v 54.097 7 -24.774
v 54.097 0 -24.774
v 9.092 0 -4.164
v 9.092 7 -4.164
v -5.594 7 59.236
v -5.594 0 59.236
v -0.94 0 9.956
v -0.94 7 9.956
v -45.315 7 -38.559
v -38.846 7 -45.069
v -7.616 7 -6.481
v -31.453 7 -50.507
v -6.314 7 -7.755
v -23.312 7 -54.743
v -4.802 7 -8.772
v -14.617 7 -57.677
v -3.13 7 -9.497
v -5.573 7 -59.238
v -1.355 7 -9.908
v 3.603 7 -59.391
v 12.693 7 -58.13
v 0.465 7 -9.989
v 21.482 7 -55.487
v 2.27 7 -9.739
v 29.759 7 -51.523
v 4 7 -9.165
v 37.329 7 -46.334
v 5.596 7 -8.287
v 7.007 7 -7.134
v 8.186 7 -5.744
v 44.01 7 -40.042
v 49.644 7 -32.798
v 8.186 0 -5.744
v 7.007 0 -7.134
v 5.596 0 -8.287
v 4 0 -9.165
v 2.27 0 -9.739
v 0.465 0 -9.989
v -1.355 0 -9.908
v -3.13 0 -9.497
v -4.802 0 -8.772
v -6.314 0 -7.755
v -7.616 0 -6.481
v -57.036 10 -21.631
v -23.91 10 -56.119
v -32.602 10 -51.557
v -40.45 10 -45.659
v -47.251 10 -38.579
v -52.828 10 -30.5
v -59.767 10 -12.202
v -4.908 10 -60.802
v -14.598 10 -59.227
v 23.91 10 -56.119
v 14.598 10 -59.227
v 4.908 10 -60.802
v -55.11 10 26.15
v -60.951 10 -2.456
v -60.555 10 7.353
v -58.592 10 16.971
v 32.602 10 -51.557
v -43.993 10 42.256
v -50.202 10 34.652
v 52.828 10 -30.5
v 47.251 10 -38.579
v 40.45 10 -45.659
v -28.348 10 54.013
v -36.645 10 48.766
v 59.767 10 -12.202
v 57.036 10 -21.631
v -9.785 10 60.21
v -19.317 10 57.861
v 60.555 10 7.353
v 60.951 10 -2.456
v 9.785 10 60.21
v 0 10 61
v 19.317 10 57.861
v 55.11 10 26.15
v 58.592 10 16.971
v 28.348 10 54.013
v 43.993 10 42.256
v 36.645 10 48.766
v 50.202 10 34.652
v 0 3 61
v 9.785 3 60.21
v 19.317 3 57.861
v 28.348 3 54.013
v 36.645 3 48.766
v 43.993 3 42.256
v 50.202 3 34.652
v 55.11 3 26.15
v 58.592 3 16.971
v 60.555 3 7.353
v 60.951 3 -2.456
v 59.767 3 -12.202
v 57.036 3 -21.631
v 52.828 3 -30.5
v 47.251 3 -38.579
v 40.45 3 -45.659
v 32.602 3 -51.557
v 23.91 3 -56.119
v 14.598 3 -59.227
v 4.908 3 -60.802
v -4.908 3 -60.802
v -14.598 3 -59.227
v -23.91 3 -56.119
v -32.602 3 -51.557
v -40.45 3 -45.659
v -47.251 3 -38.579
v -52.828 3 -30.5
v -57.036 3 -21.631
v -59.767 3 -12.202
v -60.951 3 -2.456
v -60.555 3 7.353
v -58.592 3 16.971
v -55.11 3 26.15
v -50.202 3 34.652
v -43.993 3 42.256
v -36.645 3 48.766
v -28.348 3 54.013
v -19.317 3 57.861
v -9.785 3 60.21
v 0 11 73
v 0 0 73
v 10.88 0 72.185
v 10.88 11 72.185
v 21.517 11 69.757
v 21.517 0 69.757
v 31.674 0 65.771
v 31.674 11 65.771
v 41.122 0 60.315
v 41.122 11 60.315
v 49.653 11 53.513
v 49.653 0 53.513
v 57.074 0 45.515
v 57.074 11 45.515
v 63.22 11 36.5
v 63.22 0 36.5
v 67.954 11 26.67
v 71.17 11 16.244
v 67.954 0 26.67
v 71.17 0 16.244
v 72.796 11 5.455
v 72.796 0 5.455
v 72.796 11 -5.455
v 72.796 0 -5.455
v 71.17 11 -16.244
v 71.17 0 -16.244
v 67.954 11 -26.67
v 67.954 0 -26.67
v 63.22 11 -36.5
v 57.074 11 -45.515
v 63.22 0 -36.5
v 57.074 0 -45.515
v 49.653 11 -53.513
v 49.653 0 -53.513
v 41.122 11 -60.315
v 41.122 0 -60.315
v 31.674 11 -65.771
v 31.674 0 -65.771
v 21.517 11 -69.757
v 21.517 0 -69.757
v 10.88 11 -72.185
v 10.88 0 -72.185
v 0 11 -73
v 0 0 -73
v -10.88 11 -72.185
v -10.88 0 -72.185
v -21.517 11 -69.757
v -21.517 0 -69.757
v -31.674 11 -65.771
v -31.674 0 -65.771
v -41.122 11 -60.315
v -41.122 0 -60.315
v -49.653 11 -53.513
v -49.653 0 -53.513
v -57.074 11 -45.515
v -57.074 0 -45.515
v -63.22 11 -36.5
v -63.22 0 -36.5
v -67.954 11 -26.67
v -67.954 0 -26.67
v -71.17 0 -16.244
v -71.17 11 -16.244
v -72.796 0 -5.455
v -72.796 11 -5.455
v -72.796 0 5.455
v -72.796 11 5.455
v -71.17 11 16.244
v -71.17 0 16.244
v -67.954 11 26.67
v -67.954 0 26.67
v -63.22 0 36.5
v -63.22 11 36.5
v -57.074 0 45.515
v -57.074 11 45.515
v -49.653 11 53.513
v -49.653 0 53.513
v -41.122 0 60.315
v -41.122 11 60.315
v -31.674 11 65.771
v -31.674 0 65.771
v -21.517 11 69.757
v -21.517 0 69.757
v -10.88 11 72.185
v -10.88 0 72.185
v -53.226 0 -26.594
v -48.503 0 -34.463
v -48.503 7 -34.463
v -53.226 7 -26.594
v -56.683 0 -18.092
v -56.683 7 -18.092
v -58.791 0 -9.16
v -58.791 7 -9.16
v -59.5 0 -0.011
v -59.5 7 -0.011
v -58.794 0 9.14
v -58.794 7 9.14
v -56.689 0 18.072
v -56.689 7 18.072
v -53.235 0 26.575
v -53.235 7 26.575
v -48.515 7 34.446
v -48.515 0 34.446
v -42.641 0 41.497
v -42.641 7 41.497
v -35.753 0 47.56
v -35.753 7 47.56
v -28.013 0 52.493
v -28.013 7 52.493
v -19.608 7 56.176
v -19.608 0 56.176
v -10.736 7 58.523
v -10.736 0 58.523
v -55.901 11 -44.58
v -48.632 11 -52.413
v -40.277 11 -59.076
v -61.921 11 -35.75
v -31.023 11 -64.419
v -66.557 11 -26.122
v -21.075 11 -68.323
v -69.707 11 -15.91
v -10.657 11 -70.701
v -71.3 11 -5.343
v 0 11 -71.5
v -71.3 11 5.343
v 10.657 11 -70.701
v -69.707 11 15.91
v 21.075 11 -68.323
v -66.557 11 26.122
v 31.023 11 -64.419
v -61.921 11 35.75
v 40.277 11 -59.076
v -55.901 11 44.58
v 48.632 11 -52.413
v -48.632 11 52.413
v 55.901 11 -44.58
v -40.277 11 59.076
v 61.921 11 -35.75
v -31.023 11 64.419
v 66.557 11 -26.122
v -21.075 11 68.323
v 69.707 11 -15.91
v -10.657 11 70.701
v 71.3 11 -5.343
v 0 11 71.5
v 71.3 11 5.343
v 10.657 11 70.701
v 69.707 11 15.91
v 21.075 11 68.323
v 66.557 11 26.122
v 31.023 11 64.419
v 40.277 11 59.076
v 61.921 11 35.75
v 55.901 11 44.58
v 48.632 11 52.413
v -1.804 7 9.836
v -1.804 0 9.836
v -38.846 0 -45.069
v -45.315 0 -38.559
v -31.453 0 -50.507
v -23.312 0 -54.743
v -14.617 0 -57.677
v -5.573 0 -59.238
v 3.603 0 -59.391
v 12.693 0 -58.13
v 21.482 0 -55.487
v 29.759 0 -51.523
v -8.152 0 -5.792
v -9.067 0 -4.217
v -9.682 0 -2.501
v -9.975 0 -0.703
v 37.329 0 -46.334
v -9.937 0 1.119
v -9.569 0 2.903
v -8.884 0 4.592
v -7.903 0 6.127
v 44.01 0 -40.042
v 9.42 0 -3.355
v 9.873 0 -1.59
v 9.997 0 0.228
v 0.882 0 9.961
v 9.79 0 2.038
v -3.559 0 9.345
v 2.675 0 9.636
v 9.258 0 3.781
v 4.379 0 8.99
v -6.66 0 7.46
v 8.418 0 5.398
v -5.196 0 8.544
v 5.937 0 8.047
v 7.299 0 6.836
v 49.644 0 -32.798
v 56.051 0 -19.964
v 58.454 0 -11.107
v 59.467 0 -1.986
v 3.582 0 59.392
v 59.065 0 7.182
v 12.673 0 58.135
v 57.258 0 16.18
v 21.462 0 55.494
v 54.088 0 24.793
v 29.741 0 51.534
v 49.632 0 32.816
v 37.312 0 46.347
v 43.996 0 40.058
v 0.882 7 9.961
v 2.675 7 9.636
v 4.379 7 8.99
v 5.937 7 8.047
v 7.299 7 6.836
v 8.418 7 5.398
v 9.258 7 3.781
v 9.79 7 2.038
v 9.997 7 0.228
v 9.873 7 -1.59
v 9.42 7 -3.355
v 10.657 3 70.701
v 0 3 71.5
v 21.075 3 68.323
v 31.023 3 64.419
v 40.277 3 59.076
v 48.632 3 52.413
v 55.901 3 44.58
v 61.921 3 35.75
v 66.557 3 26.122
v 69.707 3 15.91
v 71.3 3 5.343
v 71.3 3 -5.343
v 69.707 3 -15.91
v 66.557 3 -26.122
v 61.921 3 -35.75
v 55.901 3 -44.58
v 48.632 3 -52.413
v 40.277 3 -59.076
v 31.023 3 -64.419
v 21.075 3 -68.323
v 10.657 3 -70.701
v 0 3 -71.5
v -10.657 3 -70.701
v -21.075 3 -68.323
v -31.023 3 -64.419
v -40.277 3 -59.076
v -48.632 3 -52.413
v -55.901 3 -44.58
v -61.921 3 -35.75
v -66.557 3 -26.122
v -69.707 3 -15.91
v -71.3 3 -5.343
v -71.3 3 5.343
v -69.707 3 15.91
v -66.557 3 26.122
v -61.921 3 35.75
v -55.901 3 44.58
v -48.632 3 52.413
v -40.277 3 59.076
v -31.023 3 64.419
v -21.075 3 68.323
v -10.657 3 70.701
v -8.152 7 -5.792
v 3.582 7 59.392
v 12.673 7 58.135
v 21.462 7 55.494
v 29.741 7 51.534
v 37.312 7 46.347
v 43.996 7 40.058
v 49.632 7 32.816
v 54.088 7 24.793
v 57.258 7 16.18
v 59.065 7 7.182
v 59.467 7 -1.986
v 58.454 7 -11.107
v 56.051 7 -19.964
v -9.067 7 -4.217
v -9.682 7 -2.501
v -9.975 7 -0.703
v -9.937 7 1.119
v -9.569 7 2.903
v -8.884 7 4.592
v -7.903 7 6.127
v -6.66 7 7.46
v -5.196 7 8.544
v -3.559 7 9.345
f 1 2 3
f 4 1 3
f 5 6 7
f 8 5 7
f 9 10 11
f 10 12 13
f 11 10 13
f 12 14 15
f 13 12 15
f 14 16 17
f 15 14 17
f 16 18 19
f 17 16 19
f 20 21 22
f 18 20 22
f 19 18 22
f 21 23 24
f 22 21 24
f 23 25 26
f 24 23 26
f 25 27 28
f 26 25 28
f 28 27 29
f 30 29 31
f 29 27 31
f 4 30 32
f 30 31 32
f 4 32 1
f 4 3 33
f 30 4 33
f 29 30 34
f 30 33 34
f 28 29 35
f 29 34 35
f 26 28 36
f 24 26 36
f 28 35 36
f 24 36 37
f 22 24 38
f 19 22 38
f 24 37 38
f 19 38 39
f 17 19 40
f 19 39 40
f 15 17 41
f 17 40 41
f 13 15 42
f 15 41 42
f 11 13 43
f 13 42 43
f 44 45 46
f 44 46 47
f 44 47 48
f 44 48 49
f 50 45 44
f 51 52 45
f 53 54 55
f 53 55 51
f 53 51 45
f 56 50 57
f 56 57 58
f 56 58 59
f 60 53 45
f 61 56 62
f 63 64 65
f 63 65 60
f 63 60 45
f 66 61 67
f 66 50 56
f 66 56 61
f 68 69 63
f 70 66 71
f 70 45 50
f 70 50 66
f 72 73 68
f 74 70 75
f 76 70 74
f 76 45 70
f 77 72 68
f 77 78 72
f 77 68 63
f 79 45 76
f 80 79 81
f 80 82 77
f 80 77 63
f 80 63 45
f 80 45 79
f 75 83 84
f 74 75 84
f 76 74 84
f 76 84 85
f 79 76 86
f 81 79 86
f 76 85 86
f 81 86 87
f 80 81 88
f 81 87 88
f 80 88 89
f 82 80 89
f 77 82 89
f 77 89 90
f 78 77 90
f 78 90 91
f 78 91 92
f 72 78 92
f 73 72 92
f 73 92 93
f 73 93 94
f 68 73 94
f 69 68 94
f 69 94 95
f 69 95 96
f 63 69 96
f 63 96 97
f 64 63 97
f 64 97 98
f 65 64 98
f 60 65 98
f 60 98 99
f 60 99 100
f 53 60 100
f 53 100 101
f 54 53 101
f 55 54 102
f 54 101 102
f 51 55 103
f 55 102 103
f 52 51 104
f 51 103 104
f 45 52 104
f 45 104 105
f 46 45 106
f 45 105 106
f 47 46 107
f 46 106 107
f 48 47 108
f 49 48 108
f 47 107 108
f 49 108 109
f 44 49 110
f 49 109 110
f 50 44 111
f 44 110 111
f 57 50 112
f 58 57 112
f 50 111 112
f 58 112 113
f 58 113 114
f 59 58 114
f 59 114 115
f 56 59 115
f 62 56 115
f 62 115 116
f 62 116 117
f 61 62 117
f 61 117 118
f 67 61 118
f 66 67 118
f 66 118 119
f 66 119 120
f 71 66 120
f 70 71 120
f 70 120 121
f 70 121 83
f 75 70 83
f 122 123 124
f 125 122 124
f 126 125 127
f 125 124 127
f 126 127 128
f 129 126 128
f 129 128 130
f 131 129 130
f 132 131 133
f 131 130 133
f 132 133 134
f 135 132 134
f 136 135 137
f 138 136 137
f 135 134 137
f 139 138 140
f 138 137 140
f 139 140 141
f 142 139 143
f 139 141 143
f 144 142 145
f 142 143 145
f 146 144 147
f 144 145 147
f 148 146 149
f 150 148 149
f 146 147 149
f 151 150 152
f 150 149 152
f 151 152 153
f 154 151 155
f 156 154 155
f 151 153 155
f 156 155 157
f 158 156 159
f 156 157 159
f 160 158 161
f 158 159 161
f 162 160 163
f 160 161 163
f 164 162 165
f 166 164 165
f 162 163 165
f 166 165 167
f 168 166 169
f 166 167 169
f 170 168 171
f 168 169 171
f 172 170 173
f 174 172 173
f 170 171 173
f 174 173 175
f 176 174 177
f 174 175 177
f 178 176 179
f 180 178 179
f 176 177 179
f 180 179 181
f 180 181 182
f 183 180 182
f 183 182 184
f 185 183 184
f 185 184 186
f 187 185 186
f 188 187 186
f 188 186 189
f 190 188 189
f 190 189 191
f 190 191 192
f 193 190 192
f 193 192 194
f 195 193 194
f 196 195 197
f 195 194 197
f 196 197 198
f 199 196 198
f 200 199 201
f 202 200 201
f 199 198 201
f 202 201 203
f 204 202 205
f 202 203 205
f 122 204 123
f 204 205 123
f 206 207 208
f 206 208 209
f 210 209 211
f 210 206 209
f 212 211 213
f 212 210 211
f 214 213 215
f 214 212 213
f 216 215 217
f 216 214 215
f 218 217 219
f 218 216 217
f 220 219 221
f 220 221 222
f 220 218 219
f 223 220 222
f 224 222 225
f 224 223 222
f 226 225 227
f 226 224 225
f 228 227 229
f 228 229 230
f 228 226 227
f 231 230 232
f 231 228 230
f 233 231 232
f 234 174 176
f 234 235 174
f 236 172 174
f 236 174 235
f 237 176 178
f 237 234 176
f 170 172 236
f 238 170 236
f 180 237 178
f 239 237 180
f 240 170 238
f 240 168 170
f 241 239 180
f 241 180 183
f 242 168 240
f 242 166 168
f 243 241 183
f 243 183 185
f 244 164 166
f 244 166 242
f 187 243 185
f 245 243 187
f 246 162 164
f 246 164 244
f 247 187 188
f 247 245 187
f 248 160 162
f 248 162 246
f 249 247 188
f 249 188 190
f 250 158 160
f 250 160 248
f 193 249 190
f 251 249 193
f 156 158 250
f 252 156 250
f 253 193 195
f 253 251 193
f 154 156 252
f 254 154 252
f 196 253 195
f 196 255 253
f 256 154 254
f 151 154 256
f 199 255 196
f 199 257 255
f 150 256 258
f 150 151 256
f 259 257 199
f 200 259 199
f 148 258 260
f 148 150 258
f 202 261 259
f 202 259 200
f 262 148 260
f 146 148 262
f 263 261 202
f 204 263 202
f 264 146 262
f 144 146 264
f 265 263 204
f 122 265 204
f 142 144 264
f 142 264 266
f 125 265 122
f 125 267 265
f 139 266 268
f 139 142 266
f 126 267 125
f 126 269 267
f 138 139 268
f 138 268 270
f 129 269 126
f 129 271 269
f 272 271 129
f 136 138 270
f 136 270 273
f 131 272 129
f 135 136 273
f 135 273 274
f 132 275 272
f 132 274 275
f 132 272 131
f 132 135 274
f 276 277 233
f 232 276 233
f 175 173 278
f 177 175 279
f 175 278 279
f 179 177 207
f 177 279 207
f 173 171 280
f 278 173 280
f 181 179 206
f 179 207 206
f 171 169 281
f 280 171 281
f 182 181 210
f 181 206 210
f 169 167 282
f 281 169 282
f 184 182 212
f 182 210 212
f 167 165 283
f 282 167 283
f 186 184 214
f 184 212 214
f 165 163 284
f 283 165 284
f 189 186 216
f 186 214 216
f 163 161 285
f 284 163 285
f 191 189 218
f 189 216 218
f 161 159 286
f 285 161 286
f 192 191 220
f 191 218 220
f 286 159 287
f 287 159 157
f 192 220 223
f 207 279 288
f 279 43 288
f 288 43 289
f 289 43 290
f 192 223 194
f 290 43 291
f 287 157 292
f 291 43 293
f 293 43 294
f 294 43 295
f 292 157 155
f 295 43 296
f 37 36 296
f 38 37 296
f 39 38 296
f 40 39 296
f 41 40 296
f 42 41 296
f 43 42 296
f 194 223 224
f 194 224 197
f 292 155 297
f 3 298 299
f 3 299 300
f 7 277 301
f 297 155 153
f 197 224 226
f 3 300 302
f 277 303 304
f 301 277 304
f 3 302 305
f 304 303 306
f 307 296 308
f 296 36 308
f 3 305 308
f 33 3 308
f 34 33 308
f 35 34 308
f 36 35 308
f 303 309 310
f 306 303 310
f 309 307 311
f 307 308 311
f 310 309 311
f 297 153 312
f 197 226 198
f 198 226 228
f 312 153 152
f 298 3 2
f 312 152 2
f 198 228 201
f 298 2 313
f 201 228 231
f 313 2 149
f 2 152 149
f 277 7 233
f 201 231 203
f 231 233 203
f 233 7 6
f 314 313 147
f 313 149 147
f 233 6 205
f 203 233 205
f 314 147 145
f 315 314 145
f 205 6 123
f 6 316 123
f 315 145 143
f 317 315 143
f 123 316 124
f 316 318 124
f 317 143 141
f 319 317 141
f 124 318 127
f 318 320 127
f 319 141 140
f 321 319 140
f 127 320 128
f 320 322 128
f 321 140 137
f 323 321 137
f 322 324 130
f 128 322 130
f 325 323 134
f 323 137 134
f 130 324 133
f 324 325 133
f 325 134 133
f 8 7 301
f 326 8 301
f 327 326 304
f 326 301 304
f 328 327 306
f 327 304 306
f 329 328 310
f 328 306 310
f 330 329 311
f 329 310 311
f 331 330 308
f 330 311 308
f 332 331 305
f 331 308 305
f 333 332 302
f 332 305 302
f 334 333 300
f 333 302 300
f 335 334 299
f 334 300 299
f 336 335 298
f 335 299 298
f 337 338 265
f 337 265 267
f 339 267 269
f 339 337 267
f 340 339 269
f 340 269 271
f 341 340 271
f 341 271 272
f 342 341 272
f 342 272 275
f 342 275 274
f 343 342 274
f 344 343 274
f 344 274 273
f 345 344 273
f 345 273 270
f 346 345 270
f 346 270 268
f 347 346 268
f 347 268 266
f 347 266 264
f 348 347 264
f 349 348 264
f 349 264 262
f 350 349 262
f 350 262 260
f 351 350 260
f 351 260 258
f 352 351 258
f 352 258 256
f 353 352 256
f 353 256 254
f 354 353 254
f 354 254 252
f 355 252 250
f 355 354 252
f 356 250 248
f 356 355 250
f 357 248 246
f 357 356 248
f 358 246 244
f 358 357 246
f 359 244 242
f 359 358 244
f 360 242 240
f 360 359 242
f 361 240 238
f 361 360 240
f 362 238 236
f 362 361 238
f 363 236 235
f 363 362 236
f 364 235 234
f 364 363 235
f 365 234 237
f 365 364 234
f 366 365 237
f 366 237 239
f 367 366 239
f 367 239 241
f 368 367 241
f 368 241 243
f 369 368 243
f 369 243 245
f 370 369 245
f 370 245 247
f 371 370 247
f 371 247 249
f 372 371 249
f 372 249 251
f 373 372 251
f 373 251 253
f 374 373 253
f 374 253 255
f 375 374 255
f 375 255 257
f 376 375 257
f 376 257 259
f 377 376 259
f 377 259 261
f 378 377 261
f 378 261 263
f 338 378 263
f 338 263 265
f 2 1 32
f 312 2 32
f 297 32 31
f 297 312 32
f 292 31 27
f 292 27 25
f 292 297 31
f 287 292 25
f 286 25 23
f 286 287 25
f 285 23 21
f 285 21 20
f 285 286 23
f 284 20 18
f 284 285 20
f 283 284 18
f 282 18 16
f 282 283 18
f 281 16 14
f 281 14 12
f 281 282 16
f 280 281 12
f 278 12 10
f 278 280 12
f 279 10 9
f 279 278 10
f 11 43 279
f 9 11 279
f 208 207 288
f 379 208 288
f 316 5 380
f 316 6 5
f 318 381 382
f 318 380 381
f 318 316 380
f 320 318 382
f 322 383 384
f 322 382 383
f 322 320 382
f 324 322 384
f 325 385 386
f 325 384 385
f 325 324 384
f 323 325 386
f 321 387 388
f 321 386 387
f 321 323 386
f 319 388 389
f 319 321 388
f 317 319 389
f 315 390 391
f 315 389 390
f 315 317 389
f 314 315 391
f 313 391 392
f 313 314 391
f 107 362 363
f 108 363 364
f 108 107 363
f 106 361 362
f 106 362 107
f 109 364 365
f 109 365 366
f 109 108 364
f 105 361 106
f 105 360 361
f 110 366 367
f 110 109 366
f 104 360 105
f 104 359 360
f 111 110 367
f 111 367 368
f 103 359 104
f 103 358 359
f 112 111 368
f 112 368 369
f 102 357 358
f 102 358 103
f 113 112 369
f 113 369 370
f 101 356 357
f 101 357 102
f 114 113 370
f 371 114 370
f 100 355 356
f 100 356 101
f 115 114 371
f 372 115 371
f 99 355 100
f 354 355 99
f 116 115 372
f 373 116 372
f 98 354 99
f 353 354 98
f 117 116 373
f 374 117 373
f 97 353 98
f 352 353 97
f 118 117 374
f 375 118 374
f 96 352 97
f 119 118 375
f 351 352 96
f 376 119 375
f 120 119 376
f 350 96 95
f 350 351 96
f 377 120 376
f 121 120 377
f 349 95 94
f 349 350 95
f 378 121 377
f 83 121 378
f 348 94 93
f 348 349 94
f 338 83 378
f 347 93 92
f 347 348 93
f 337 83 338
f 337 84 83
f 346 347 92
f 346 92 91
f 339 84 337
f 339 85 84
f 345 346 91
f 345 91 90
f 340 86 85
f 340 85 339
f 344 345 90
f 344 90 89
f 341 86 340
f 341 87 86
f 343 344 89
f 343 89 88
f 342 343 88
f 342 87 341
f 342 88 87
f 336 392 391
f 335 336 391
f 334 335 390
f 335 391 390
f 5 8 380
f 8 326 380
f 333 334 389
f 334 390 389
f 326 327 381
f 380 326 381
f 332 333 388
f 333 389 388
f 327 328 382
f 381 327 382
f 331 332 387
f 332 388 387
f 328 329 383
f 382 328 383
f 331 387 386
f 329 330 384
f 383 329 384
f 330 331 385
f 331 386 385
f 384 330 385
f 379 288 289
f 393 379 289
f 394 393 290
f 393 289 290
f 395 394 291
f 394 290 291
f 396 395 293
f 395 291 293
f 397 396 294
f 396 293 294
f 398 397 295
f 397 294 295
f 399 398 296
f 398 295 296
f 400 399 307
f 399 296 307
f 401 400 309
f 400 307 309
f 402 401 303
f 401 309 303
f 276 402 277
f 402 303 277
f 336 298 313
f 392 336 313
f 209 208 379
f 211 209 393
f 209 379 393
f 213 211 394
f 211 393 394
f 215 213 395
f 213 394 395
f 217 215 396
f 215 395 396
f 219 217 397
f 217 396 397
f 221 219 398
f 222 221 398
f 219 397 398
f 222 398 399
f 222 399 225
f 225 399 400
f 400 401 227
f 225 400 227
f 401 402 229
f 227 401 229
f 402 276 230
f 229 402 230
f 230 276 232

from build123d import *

# Parameters (mm, degrees)
SKETCH_1_R      = 73
SKETCH_1_R_2    = 71.5
EXTRUDE_1_DEPTH = 11
SKETCH_2_R      = 71.5
SKETCH_2_R_2    = 61
EXTRUDE_2_DEPTH = 3
SKETCH_3_R      = 61
SKETCH_3_R_2    = 59.5
EXTRUDE_3_DEPTH = 10
EXTRUDE_START   = 7
SKETCH_4_R      = 59.5
EXTRUDE_4_DEPTH = 3
EXTRUDE_5_DEPTH = 7


with BuildPart() as part:
    # 스케치1 → 보스-돌출1 (new body)
    with BuildSketch(Plane(origin=(0, 0, 0), x_dir=(1, 0, 0), z_dir=(0, 1, 0))):
        with Locations(Location((0, 0, 0), (0, 0, 270))):
            Circle(SKETCH_1_R)
        with Locations(Location((0, 0, 0), (0, 0, 270))):
            Circle(SKETCH_1_R_2, mode=Mode.SUBTRACT)
    extrude(amount=EXTRUDE_1_DEPTH)

    # 스케치2 → 보스-돌출2 (add)
    with BuildSketch(Plane(origin=(0, 0, 0), x_dir=(1, 0, 0), z_dir=(0, 1, 0))):
        with Locations(Location((0, 0, 0), (0, 0, 270))):
            Circle(SKETCH_2_R)
        with Locations(Location((0, 0, 0), (0, 0, 270))):
            Circle(SKETCH_2_R_2, mode=Mode.SUBTRACT)
    extrude(amount=EXTRUDE_2_DEPTH)

    # 스케치3 → 보스-돌출3 (add)
    with BuildSketch(Plane(origin=(0, 0, 0), x_dir=(1, 0, 0), z_dir=(0, 1, 0))):
        with Locations(Location((0, 0, 0), (0, 0, 270))):
            Circle(SKETCH_3_R)
        with Locations(Location((0, 0, 0), (0, 0, 270))):
            Circle(SKETCH_3_R_2, mode=Mode.SUBTRACT)
    extrude(amount=EXTRUDE_3_DEPTH)

    # 스케치4 → 보스-돌출4 (add)
    with BuildSketch(Plane(origin=(0, 0, 0), x_dir=(1, 0, 0), z_dir=(0, 1, 0)).offset(EXTRUDE_START)):
        with Locations(Location((0, 0, 0), (0, 0, 270))):
            Circle(SKETCH_4_R)
    extrude(amount=EXTRUDE_4_DEPTH)

    # 스케치6 → 보스-돌출5 (add)
    with BuildSketch(Plane.XZ.offset(-7).offset(EXTRUDE_START)):
        with BuildLine():
            Line((-1.804298071, 9.835878632), (-10.73557352, 58.523477863))
            ThreePointArc((-10.73557352, 58.523477863), (-8.172597382, 58.93605562), (-5.594064241, 59.236445245))
            Line((-5.594064241, 59.236445245), (-0.940178864, 9.955705083))
            ThreePointArc((-0.940178864, 9.955705083), (7.891398769, 6.142135253), (9.4202698, -3.355371351))
            Line((9.4202698, -3.355371351), (56.050605307, -19.964459539))
            ThreePointArc((56.050605307, -19.964459539), (55.126420057, -22.390350862), (54.097298532, -24.77362088))
            Line((54.097298532, -24.77362088), (9.091982947, -4.163633761))
            ThreePointArc((9.091982947, -4.163633761), (1.373545779, -9.905219432), (-7.615971729, -6.480507281))
            Line((-7.615971729, -6.480507281), (-45.315031787, -38.559018324))
            ThreePointArc((-45.315031787, -38.559018324), (-46.953822675, -36.545704758), (-48.503234292, -34.462824365))
            Line((-48.503234292, -34.462824365), (-8.151804083, -5.792071322))
            ThreePointArc((-8.151804083, -5.792071322), (-9.264944547, 3.763084178), (-1.804298071, 9.835878632))
        make_face()
    extrude(amount=-EXTRUDE_5_DEPTH)


solid = part.part
